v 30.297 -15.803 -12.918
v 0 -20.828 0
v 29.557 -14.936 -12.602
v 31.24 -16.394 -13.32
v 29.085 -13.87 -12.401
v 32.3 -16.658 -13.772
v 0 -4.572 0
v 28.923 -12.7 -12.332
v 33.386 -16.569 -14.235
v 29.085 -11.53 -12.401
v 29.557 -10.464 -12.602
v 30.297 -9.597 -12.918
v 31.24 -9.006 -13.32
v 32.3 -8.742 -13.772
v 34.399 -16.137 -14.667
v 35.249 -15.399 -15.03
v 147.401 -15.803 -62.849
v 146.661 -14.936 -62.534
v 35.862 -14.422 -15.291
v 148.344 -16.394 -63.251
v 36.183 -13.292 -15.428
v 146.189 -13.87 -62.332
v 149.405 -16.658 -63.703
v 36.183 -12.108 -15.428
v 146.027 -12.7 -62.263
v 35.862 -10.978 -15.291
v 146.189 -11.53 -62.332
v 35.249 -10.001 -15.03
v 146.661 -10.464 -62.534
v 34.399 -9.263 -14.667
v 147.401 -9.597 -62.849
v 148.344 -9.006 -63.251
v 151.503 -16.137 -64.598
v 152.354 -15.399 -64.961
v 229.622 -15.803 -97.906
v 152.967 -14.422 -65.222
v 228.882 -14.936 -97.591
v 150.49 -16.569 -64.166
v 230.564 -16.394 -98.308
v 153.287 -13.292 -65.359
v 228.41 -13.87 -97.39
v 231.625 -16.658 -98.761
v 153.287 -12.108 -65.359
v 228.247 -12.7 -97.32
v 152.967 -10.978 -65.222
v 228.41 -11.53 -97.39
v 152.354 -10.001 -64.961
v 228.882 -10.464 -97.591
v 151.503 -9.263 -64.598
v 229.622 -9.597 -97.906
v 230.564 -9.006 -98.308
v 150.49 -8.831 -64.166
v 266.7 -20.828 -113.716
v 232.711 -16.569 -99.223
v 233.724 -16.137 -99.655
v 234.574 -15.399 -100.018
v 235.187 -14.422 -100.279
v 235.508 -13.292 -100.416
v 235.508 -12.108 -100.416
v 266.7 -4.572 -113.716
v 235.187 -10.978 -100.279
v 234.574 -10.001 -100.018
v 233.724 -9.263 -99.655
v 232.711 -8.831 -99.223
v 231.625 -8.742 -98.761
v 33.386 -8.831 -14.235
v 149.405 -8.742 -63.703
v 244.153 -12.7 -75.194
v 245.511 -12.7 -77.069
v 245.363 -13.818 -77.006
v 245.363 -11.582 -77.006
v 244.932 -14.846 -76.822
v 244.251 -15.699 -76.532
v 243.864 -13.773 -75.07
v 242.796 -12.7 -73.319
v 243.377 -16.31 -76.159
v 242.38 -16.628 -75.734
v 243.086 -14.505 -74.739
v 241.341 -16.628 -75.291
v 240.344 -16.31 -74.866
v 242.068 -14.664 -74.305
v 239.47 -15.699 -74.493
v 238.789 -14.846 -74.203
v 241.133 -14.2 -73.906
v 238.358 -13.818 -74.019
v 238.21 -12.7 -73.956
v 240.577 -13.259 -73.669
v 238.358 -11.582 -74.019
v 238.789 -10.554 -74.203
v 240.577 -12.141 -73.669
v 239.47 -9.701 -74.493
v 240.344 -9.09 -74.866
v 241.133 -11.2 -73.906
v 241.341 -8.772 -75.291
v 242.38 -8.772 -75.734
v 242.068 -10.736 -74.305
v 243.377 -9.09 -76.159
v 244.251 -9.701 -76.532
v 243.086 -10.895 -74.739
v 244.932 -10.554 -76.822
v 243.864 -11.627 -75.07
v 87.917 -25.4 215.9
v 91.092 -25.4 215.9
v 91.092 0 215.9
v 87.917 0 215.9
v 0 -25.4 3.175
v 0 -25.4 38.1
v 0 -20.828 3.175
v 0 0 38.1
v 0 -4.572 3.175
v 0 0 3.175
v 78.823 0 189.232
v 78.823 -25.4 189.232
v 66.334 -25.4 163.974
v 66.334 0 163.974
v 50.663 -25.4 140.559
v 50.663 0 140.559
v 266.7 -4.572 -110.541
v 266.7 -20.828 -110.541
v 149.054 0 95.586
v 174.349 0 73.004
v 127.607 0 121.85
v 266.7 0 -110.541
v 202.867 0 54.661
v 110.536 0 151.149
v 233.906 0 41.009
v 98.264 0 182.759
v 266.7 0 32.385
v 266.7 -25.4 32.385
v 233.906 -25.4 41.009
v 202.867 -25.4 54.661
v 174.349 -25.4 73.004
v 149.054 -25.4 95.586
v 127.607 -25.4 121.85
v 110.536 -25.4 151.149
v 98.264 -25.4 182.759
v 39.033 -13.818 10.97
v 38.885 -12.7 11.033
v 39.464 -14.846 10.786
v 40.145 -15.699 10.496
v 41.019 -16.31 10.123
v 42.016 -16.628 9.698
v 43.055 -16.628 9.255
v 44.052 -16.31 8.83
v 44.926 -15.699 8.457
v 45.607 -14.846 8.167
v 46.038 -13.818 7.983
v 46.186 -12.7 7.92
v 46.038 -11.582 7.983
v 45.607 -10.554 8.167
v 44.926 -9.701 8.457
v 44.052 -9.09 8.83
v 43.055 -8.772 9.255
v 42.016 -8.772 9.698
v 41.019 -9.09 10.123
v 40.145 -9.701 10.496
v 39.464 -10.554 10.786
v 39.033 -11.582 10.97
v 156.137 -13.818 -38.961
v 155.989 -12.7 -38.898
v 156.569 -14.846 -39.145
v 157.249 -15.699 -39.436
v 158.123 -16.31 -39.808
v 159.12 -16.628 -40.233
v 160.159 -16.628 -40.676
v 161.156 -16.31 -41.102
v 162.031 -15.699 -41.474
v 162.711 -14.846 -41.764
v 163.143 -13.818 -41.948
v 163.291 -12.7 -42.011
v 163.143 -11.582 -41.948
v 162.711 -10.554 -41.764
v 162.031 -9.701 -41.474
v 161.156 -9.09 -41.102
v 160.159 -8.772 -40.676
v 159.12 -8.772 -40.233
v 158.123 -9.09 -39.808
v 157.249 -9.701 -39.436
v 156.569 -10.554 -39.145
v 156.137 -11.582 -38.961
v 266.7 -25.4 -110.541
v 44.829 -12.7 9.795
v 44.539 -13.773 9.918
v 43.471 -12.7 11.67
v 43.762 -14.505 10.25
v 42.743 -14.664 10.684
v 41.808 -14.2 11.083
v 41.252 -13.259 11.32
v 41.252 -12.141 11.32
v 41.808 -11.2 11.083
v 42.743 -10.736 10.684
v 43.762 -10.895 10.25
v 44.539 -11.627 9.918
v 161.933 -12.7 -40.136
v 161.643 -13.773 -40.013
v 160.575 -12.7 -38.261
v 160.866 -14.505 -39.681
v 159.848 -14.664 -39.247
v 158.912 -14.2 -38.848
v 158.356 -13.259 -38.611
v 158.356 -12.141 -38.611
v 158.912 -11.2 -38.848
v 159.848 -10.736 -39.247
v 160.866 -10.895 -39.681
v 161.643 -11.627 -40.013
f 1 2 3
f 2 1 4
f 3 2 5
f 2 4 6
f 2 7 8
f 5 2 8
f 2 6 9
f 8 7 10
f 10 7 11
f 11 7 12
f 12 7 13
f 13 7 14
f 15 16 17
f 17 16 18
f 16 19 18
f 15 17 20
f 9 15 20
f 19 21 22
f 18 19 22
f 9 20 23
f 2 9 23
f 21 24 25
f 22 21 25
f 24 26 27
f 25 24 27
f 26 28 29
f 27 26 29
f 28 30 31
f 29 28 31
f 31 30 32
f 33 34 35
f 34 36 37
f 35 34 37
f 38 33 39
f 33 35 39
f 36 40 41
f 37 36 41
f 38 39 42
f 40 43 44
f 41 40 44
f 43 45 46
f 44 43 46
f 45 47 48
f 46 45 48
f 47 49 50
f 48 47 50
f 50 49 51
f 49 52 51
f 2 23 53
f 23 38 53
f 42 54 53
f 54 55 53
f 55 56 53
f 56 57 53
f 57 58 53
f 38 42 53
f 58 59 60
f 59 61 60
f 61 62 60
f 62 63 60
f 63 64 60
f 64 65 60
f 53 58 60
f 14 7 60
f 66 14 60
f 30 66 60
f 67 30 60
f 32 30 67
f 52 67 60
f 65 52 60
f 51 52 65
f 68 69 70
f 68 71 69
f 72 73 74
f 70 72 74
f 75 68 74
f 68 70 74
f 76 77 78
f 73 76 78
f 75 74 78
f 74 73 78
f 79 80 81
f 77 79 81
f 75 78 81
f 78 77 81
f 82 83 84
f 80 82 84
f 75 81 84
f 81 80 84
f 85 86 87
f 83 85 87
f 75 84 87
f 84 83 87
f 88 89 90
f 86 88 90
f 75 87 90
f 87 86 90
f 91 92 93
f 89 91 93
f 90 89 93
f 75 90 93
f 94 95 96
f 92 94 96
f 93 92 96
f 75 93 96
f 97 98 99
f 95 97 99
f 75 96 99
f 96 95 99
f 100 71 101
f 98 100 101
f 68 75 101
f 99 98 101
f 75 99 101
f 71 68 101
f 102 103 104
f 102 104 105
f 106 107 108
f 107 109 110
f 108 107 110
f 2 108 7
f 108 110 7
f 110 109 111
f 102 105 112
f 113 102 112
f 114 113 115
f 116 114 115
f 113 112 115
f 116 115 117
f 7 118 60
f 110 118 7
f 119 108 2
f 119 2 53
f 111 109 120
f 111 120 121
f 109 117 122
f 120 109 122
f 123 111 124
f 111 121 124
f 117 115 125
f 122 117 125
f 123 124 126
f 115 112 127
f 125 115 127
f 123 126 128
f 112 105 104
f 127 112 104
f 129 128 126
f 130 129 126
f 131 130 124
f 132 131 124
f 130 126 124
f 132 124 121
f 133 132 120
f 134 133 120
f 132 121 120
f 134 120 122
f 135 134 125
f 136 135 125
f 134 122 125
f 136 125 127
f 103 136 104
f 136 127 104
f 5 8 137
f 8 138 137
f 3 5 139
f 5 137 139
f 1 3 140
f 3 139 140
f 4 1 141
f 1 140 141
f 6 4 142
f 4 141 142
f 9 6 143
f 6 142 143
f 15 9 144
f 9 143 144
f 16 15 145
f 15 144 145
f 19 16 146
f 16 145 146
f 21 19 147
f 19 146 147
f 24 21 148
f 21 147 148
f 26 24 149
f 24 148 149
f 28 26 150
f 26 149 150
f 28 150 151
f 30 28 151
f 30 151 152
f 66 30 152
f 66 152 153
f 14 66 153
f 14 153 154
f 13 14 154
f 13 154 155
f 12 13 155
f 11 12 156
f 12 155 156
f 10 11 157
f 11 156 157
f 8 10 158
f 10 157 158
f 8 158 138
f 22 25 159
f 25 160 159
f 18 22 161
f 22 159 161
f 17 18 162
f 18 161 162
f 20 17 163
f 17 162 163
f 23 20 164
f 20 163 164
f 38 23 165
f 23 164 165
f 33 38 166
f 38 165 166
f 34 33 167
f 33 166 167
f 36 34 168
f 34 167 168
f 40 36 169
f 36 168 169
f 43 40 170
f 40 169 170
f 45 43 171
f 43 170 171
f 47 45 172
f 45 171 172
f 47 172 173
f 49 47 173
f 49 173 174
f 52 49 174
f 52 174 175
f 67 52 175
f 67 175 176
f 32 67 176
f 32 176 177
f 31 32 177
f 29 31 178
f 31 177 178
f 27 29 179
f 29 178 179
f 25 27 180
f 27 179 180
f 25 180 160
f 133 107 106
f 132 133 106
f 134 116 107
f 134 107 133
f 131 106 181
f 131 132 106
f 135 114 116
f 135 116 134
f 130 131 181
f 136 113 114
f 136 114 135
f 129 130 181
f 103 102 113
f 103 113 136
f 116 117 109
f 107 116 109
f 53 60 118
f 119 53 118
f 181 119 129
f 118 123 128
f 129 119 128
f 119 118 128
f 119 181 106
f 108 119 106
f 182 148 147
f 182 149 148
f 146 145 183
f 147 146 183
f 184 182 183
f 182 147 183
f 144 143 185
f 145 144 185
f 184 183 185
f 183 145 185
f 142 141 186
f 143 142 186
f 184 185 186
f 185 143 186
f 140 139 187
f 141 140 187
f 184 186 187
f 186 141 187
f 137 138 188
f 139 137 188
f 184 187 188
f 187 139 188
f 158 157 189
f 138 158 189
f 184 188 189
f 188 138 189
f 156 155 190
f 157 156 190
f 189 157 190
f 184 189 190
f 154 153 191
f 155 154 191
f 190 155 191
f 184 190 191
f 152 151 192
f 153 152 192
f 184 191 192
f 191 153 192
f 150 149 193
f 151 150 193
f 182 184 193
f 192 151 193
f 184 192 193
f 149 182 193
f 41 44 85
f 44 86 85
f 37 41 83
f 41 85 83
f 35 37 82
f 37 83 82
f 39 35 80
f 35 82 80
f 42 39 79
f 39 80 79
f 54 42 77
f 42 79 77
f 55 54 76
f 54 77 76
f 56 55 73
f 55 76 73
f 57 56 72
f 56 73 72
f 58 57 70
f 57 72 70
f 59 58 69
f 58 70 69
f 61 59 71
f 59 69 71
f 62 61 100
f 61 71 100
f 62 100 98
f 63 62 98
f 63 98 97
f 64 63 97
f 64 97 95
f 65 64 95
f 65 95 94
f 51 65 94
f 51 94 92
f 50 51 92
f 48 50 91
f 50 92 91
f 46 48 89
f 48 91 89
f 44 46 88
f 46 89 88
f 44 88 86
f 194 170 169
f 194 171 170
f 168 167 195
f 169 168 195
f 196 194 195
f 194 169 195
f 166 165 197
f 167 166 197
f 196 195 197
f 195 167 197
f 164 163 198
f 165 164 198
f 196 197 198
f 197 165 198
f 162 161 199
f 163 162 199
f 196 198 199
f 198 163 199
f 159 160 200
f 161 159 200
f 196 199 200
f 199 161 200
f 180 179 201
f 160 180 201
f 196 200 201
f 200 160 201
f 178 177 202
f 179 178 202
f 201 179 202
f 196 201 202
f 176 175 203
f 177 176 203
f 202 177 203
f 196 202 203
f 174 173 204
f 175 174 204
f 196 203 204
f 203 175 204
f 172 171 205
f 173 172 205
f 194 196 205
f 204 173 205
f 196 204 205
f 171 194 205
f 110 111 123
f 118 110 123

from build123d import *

# Parameters (mm, degrees)
F1_DEPTH = 25.4
F3_D     = 7.9375
F3_DEPTH = 25.4
F3_TIP   = 2.3846655818
F5_DEPTH = 4.572
F7_DEPTH = 4.572


with BuildPart() as f1:
    # F0 (on Front) → F1 (new body)
    with BuildSketch(Plane.XZ):
        with BuildLine():
            ThreePointArc((266.7, 32.3849999569), (149.0538498691, 95.5862080763), (91.0917861403, 215.8999999569))
            Line((91.0917861403, 215.8999999569), (87.9167861403, 215.8999999569))
            ThreePointArc((87.9167861403, 215.8999999569), (72.9914115298, 176.3989748545), (50.662743739, 140.5586569695))
            Line((50.662743739, 140.5586569695), (0, 38.0999999569))
            Line((0, 38.0999999569), (0, -4.31e-08))
            Line((0, -4.31e-08), (266.7, -113.7158000431))
            Line((266.7, -113.7158000431), (266.7, -4.31e-08))
            Line((266.7, -4.31e-08), (266.7, 32.3849999569))
        make_face()
    extrude(amount=F1_DEPTH)

    # F3
    with Locations(Plane(origin=(-1.56e-08, 0, -3.65e-08), x_dir=(0.9198730081, 0, -0.3922163293), z_dir=(-0.3922163293, 0, -0.9198730081))):
        with Locations((35.4106249365, 12.7), (162.7154249365, 12.7), (252.0980249365, 12.7)):
            Hole(F3_D / 2, depth=F3_DEPTH)
            with Locations((0, 0, -(F3_DEPTH + F3_TIP / 2))):  # 118° drill point
                Cone(0, F3_D / 2, F3_TIP, mode=Mode.SUBTRACT)

    # F4 (on face) → F5 (cut)
    with BuildSketch(Plane.XZ.offset(25.4)):
        Polygon((0, 3.1749999569), (0, -4.31e-08), (266.7, -113.7158000431), (266.7, -110.5408000431), align=None)
    extrude(amount=-F5_DEPTH, mode=Mode.SUBTRACT)

    # F6 (on face) → F7 (cut)
    with BuildSketch(Plane(origin=(0, 0, 0), x_dir=(-1, 0, 0), z_dir=(0, 1, 0))):
        Polygon((-266.7, -110.5408000431), (-266.7, -113.7158000431), (0, -4.31e-08), (0, 3.1749999569), align=None)
    extrude(amount=-F7_DEPTH, mode=Mode.SUBTRACT)


solid = f1.part
